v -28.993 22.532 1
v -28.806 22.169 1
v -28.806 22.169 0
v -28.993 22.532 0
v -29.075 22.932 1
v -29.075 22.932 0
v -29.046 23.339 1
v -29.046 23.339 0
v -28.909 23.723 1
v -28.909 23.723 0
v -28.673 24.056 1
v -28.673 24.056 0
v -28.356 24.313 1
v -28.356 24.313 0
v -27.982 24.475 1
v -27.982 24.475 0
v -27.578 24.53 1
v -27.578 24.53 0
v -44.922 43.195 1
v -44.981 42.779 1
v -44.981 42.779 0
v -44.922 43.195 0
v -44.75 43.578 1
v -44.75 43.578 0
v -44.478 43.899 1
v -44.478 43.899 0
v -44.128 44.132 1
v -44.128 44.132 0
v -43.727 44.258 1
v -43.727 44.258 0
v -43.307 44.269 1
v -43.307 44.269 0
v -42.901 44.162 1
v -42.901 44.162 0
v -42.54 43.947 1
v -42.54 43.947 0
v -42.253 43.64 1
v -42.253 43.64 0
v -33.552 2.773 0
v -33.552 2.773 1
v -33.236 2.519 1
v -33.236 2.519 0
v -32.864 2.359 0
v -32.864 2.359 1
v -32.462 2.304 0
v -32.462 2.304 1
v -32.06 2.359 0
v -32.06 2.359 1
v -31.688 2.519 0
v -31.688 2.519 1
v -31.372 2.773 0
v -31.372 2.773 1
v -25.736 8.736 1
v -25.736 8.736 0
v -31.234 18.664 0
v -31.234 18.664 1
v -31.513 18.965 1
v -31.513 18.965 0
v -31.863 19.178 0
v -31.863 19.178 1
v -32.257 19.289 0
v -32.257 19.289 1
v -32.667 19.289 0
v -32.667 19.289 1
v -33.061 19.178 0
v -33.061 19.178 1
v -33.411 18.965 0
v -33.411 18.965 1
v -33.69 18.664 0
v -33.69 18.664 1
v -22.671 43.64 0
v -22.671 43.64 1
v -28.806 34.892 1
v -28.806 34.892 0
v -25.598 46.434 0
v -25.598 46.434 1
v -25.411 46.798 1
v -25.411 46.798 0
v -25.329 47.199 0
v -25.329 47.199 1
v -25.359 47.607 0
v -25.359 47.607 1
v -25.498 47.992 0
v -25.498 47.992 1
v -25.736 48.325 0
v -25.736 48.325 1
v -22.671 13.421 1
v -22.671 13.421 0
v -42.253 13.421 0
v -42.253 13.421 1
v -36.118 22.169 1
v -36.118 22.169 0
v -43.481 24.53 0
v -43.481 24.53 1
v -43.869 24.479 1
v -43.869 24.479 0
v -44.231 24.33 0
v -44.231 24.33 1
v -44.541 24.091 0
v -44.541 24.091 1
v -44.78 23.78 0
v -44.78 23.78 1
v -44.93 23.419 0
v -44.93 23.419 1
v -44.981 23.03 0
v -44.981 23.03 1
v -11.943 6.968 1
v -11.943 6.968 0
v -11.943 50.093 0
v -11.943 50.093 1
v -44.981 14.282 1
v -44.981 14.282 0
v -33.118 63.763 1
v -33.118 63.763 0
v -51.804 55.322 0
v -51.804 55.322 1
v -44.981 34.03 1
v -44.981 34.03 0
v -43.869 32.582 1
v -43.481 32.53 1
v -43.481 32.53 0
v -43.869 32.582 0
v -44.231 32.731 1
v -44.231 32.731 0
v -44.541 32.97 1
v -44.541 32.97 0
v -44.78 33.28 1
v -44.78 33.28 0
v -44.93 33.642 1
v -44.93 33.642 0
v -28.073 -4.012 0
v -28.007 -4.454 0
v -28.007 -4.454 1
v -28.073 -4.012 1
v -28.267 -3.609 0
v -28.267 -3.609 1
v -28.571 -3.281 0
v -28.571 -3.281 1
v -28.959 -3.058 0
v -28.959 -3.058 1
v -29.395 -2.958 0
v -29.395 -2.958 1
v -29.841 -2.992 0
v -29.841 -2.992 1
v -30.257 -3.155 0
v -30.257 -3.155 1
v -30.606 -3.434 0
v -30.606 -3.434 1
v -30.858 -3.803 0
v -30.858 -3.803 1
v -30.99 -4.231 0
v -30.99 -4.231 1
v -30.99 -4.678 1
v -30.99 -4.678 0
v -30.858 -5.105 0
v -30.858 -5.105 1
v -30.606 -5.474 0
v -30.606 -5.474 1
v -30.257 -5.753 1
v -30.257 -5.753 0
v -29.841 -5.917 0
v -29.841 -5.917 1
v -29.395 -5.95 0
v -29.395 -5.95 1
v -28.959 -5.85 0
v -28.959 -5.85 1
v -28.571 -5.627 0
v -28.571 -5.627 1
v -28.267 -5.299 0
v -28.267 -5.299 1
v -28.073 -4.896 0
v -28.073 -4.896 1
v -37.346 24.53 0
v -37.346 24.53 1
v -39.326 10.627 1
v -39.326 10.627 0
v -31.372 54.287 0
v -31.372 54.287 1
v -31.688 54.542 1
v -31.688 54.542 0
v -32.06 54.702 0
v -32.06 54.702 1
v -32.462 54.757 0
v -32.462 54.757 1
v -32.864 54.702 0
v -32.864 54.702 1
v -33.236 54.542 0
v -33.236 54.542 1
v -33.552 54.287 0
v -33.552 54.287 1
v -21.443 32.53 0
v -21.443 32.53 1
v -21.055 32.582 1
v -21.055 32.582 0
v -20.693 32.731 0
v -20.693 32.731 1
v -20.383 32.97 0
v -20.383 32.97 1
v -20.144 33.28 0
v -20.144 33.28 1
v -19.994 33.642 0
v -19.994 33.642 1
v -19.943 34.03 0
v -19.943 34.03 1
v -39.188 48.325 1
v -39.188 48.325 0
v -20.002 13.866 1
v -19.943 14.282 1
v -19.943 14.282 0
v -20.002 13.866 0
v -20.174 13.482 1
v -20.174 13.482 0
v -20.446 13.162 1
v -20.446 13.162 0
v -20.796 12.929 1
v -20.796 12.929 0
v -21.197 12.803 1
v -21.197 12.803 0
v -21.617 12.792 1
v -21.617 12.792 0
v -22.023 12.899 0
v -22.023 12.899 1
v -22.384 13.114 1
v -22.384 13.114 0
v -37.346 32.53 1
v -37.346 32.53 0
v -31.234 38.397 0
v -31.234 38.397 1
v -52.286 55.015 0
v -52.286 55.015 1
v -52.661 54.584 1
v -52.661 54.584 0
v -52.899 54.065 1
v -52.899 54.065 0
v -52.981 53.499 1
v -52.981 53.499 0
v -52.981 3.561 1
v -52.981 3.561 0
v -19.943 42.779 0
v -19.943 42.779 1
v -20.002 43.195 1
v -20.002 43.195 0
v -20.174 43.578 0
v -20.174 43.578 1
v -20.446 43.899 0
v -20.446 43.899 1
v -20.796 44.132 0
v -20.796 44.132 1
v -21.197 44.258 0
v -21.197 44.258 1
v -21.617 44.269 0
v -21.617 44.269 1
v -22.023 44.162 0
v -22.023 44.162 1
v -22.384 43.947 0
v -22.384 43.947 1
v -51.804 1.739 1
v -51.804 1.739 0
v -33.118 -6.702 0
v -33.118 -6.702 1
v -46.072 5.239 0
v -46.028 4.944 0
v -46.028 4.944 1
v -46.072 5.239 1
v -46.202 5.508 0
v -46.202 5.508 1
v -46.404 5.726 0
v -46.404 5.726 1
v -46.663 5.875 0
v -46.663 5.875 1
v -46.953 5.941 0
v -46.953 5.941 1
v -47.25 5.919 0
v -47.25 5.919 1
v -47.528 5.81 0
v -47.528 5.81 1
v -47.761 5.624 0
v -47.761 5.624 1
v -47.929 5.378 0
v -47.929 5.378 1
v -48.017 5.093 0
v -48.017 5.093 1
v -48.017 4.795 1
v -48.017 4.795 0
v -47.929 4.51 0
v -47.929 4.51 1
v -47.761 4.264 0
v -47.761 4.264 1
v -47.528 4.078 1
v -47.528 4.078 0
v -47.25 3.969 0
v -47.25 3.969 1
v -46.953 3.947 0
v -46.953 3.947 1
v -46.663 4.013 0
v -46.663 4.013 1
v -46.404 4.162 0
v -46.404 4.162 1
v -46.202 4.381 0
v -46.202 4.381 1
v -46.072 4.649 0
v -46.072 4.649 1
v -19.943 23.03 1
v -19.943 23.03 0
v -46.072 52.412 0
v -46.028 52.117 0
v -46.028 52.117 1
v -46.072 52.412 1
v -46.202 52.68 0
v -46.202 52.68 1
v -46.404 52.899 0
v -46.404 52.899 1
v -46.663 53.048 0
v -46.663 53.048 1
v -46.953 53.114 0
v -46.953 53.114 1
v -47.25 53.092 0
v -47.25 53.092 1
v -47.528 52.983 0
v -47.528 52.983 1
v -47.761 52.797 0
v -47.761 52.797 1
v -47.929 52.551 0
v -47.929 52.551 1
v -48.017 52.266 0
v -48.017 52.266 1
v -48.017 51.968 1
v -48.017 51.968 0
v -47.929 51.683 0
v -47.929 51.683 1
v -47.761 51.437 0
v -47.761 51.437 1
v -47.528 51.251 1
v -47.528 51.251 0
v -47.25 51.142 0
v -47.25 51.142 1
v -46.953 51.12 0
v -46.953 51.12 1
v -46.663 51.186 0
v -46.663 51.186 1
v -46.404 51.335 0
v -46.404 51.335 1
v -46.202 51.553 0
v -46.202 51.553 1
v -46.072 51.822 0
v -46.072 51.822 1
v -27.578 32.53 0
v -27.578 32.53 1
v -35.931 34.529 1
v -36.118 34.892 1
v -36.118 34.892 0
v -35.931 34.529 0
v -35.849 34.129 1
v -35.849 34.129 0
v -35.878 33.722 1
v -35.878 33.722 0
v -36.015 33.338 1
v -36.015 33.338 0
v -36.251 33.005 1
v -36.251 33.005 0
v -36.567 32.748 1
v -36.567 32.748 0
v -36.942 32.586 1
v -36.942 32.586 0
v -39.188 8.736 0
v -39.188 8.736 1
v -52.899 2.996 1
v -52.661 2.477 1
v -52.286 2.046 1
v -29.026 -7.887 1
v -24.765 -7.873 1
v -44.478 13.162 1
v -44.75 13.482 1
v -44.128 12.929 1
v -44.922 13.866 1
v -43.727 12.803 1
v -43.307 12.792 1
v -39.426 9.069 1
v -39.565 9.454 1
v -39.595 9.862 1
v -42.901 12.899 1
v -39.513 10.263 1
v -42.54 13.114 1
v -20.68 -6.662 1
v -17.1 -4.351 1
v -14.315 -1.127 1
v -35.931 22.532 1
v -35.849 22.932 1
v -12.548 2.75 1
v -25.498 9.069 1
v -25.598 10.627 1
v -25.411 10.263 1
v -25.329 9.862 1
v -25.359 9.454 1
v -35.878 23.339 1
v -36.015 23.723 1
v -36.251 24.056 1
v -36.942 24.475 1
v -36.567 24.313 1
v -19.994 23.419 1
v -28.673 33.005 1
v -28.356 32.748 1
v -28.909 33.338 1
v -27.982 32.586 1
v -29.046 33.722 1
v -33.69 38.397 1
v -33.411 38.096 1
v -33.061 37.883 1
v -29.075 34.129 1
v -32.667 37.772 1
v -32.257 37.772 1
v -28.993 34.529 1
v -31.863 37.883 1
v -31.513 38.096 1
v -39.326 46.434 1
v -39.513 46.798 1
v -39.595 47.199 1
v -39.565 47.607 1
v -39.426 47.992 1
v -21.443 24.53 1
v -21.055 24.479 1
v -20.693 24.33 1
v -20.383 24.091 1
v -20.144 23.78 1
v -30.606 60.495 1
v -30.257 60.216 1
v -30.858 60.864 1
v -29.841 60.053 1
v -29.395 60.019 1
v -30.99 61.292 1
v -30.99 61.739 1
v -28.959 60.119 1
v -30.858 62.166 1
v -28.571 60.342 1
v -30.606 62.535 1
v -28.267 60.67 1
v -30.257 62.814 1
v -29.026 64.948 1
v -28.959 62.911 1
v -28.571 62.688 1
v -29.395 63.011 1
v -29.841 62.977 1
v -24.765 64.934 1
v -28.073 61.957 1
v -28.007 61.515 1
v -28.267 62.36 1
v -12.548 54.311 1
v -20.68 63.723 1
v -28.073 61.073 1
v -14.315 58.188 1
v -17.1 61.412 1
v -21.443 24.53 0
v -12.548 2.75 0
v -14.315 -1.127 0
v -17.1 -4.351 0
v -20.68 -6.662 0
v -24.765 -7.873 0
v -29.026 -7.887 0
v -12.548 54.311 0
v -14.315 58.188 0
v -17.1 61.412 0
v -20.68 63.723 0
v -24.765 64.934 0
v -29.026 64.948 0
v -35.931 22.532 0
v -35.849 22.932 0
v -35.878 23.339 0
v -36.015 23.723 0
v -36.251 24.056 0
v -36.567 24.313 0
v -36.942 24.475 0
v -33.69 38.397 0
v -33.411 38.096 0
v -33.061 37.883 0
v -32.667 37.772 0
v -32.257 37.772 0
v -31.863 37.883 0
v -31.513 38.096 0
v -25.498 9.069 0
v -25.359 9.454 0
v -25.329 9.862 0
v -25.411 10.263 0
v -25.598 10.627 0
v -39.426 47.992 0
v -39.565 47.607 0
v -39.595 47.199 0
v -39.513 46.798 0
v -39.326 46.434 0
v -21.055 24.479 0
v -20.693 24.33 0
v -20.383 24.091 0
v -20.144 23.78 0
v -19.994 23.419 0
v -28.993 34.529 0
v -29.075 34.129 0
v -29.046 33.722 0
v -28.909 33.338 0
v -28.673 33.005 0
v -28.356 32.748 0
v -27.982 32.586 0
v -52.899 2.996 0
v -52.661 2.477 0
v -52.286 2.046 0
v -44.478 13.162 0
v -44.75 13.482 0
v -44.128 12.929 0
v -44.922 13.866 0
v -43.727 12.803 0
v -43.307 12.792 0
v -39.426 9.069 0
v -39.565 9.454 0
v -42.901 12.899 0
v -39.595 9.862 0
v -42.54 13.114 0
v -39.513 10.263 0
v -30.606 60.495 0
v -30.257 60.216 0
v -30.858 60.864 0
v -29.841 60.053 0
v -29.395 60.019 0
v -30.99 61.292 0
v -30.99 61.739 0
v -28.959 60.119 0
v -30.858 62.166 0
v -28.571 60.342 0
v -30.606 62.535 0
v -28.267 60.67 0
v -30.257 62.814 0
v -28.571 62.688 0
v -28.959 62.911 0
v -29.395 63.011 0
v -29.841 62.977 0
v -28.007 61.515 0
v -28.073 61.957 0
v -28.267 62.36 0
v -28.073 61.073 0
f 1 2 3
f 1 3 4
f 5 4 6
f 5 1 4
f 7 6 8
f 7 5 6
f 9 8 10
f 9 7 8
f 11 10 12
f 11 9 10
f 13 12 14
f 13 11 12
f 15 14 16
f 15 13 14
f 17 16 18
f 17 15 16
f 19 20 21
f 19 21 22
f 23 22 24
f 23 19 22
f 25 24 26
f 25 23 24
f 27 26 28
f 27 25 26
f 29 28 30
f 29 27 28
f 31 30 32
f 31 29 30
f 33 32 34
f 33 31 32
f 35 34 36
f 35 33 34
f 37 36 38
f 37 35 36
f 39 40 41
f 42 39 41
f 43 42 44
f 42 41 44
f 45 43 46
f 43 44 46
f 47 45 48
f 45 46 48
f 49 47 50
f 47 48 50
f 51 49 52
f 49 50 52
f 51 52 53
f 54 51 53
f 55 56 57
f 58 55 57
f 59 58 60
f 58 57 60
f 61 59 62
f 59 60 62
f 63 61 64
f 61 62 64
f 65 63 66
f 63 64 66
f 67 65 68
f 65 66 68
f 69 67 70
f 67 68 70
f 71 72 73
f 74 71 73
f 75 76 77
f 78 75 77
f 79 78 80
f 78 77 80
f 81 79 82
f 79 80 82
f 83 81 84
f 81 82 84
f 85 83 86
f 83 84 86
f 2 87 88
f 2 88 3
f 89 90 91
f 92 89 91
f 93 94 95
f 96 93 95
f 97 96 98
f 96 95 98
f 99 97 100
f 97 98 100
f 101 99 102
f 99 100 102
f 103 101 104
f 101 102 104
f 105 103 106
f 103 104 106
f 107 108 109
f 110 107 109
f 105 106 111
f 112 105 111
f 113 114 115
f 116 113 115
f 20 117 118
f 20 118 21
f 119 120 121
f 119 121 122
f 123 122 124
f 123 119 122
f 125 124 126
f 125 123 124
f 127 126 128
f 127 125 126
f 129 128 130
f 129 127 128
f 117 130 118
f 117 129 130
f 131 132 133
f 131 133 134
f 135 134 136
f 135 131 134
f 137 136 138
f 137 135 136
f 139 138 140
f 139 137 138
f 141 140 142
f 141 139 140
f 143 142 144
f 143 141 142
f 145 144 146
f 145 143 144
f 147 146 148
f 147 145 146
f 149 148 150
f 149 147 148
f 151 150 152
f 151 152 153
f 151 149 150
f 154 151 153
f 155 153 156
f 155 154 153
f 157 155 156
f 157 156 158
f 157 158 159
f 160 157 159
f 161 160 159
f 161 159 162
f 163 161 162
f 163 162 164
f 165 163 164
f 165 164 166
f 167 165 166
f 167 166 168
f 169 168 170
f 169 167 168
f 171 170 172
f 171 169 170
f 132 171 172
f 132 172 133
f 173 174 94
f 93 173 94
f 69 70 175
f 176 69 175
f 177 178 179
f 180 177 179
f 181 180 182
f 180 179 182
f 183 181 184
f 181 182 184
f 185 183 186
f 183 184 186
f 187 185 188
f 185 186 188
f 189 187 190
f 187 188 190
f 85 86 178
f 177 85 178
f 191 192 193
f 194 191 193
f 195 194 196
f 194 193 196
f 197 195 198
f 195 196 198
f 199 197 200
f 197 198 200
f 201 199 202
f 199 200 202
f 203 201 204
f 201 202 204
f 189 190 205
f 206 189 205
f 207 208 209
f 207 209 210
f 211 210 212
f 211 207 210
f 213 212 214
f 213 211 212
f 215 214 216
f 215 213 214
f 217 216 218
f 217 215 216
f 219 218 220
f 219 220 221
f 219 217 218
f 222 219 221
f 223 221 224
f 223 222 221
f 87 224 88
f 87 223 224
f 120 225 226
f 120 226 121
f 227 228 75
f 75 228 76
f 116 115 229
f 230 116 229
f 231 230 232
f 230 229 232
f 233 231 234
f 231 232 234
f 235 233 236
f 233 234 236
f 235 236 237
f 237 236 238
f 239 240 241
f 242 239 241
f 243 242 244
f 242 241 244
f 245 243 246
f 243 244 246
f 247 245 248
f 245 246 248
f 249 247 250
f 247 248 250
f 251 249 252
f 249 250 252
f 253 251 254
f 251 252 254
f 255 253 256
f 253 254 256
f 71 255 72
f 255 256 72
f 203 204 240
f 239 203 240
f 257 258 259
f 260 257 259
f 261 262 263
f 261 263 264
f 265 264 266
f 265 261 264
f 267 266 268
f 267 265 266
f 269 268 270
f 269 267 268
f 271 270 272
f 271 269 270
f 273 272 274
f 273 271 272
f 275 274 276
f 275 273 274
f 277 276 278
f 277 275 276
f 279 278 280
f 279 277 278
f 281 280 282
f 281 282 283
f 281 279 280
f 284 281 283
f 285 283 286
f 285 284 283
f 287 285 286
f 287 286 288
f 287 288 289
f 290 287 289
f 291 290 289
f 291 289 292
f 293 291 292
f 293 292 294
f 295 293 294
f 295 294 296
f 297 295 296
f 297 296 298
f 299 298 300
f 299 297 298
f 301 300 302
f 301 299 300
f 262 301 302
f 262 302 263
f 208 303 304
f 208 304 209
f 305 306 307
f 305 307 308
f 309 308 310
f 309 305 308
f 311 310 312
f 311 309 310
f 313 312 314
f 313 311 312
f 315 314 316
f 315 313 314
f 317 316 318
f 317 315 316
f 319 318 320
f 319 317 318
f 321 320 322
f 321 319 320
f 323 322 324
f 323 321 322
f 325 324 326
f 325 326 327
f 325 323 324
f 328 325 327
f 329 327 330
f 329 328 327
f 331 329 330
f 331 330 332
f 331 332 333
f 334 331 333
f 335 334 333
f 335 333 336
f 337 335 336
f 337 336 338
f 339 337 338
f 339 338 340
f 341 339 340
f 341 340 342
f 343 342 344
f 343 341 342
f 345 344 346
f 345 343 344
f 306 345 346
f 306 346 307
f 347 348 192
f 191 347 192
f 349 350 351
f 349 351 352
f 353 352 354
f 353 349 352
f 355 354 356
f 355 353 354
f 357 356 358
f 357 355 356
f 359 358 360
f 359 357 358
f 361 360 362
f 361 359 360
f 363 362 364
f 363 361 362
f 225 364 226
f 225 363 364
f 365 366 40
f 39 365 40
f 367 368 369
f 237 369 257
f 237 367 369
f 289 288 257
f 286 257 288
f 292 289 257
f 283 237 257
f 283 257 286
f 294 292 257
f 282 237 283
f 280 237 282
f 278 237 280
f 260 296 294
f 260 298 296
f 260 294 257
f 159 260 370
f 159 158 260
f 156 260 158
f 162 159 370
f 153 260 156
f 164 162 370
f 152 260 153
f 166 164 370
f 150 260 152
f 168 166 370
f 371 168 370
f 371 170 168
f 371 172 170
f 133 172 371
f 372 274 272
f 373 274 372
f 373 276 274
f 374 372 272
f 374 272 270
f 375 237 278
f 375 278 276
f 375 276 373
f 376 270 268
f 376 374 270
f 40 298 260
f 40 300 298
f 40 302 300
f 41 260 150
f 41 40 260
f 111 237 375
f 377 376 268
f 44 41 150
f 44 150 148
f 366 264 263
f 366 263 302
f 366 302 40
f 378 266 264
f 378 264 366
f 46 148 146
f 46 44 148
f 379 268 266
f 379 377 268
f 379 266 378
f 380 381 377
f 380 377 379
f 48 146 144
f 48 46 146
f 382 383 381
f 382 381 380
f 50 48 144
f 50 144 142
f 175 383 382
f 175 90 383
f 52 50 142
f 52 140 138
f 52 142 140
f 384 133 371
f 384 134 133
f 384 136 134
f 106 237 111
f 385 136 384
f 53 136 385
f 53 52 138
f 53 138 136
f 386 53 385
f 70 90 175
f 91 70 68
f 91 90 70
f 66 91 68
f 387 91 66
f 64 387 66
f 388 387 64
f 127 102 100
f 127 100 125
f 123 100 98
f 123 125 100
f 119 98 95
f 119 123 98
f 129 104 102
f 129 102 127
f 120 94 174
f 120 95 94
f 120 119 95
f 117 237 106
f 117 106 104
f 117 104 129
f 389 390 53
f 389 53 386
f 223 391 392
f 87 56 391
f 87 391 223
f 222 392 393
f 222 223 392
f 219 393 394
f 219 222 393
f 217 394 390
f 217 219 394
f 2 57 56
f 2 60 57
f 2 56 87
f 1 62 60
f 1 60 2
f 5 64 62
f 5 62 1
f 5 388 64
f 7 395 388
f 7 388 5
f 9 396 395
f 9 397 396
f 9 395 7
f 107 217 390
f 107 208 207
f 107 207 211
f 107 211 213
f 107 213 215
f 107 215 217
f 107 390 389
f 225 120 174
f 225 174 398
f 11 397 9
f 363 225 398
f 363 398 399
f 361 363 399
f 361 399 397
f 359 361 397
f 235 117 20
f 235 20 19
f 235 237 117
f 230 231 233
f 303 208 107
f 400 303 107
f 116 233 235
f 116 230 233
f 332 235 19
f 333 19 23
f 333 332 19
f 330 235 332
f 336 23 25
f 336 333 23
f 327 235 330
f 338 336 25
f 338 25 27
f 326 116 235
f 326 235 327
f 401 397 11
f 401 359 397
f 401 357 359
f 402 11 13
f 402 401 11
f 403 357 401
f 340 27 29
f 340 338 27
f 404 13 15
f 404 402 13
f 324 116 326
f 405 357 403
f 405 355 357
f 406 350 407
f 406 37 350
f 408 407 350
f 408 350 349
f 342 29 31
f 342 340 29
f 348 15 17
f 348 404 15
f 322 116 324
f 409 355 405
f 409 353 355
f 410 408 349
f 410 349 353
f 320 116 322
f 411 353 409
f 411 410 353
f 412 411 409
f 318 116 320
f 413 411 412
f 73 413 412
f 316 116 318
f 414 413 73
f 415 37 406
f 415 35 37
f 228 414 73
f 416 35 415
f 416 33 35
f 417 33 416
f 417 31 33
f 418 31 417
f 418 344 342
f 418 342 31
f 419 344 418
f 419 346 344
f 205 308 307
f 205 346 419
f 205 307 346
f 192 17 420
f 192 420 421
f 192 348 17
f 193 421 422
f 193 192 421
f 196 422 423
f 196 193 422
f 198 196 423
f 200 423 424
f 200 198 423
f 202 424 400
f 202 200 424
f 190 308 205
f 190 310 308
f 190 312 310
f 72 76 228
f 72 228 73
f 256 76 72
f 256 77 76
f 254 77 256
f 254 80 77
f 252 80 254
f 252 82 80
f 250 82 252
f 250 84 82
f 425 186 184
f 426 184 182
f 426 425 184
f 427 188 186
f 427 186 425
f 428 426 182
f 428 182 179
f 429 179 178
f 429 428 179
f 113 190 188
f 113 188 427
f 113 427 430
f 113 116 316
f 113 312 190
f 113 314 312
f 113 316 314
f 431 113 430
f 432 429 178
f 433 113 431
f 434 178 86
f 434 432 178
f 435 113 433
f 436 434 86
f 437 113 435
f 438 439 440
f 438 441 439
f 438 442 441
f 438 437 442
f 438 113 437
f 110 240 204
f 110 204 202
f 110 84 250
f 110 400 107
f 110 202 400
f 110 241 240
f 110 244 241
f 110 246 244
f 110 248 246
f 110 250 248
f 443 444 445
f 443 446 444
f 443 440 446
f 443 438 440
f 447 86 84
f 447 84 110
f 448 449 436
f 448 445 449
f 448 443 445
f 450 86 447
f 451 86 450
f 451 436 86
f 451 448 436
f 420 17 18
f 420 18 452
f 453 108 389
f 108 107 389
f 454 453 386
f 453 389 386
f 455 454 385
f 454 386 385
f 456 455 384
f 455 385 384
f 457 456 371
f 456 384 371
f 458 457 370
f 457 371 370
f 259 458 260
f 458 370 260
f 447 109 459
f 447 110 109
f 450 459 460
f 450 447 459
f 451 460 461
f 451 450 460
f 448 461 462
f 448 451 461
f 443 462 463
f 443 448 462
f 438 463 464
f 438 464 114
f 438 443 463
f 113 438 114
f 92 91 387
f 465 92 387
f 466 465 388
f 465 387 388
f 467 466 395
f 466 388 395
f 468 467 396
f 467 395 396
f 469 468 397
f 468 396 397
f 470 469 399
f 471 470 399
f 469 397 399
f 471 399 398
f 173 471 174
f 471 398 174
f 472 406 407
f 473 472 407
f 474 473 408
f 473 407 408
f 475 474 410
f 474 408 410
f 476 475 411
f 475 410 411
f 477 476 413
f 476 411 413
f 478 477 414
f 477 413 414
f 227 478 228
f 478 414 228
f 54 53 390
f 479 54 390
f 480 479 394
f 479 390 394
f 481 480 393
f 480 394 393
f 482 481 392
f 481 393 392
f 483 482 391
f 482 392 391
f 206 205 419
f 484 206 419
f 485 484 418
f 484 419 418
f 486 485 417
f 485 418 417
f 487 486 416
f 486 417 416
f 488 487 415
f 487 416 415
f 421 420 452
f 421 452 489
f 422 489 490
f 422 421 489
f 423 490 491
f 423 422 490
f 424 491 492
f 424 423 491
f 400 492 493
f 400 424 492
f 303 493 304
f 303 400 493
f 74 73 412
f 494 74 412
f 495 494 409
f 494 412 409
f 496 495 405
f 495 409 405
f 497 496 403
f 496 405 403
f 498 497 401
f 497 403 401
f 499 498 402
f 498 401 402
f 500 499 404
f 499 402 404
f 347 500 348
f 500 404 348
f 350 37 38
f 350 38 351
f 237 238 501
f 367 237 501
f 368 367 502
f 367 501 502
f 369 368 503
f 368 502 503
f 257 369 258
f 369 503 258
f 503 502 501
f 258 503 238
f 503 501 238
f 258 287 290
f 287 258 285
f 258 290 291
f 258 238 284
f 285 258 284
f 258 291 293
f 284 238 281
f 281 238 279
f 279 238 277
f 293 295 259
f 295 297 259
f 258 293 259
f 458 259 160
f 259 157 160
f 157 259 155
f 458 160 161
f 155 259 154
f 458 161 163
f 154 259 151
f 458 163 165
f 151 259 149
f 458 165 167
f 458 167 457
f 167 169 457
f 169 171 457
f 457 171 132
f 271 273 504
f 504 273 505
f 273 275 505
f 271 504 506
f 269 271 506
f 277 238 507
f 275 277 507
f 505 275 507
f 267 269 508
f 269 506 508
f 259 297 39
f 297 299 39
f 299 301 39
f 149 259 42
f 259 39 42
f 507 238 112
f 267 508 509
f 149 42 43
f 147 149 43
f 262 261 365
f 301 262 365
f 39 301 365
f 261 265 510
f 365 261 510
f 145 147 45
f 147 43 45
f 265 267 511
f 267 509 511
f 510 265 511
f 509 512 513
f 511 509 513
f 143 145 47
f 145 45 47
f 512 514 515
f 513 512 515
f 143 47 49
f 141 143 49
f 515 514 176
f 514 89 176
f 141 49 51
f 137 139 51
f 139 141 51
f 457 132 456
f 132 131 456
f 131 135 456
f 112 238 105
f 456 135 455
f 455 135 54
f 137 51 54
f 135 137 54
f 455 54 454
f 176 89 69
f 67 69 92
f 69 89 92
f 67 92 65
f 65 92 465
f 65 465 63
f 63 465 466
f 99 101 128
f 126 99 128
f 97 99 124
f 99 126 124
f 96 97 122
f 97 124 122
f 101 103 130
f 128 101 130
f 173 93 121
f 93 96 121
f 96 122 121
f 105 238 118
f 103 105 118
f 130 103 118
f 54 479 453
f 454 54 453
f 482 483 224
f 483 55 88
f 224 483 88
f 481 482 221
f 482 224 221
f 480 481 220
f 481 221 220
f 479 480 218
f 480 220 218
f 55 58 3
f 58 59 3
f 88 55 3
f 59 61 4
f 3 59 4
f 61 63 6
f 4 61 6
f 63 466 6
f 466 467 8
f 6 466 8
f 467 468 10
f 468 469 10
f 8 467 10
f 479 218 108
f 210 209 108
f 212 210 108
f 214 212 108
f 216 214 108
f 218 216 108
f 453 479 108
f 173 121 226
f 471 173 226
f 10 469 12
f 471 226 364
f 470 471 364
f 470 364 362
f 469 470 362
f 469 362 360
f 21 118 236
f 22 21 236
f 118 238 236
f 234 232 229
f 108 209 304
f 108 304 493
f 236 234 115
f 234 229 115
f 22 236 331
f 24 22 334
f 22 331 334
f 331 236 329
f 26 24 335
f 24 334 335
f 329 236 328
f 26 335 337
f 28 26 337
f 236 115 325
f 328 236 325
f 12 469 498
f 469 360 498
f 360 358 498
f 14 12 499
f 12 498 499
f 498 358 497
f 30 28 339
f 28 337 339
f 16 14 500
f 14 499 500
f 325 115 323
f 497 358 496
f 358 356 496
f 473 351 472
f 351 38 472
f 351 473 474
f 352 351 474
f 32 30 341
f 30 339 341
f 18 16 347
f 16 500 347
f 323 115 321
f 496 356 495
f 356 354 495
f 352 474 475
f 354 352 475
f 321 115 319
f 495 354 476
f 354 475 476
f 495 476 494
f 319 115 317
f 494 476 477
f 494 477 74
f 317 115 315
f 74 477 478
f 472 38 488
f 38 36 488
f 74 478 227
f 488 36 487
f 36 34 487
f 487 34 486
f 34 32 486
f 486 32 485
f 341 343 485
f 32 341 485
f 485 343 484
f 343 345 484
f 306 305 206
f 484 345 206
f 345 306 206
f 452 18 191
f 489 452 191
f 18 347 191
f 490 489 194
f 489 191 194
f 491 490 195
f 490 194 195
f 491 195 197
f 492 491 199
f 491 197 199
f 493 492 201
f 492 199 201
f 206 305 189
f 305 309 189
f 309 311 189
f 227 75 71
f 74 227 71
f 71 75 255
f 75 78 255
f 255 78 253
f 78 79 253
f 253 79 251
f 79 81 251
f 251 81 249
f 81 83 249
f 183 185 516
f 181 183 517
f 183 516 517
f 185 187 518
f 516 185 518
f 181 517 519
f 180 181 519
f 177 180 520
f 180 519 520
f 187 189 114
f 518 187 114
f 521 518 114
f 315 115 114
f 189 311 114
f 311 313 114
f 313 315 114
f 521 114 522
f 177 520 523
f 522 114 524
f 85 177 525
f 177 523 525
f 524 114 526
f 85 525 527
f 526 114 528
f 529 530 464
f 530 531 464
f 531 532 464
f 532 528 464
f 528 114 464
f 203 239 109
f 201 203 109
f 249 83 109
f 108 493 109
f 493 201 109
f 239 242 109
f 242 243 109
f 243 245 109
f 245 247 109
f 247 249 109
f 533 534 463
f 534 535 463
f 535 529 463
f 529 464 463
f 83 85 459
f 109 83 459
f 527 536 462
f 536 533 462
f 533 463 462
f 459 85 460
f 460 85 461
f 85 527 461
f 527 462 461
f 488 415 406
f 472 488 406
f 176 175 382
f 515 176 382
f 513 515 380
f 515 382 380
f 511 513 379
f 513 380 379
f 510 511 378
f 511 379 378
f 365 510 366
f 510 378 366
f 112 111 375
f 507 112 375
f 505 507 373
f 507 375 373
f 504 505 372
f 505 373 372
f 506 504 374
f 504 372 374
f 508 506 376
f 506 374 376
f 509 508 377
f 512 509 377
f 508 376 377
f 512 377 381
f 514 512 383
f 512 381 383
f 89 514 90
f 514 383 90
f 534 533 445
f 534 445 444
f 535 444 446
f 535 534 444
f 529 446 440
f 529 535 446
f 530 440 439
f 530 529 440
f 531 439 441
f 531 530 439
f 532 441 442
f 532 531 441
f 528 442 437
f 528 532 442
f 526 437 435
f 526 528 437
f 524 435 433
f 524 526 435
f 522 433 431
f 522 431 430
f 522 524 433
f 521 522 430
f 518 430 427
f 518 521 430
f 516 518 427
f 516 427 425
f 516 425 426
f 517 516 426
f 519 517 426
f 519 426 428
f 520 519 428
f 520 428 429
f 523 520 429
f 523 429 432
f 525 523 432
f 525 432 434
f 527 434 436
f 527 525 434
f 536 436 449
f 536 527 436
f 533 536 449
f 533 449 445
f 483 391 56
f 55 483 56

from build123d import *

# Parameters (mm, degrees)
CROQUIS3_R              = 1
CROQUIS3_R_2            = 1.500000006
CROQUIS3_R_3            = 1.000000012
CROQUIS3_R_4            = 1.5
SALIENTE_EXTRUIR1_DEPTH = 1
REDONDEO1_R             = 15
CORTAR_EXTRUIR1_DEPTH   = 1


with BuildPart() as part:
    # Croquis3 → Saliente-Extruir1 (new body)
    # profile 1 of 2: a face of its own
    with BuildSketch(Plane.XY):
        with BuildLine():
            Line((-11.943236247, 28.530474649), (-52.980665481, 28.530474649))
            Line((-52.980665481, 28.530474649), (-52.980665481, 3.561485174))
            ThreePointArc((-52.980665481, 3.561485174), (-52.660950937, 2.476754431), (-51.804024696, 1.738827882))
            Line((-51.804024696, 1.738827882), (-11.943236247, -16.267709961))
            Line((-11.943236247, -16.267709961), (-11.943236247, 28.530474649))
        make_face()
        with Locations((-47.027941845, 4.944189889)):
            Circle(CROQUIS3_R, mode=Mode.SUBTRACT)
        with Locations((-29.506723336, -4.454119513)):
            Circle(CROQUIS3_R_2, mode=Mode.SUBTRACT)
    # profile 2 of 2: a face of its own
    with BuildSketch(Plane.XY):
        with BuildLine():
            ThreePointArc((-51.804024696, 55.322121417), (-52.660950937, 54.584194868), (-52.980665481, 53.499464125))
            Line((-52.980665481, 53.499464125), (-52.980665481, 28.530474649))
            Line((-52.980665481, 28.530474649), (-11.943236247, 28.530474649))
            Line((-11.943236247, 28.530474649), (-11.943236247, 73.32865926))
            Line((-11.943236247, 73.32865926), (-51.804024696, 55.322121417))
        make_face()
        with Locations((-47.027941845, 52.116759452)):
            Circle(CROQUIS3_R_3, mode=Mode.SUBTRACT)
        with Locations((-29.506723336, 61.515068812)):
            Circle(CROQUIS3_R_4, mode=Mode.SUBTRACT)
    extrude(amount=SALIENTE_EXTRUIR1_DEPTH)

    # Redondeo1
    redondeo1_edges = [part.edges().sort_by_distance(p)[0] for p in [
        (-11.943236247, -16.267709961, 0.5),
        (-11.943236247, 73.32865926, 0.5),
    ]]
    fillet(redondeo1_edges, radius=REDONDEO1_R)

    # Croquis4 → Cortar-Extruir1 (cut)
    with BuildSketch(Plane.XY.offset(1)):
        with BuildLine():
            Line((-44.980665481, 34.030474649), (-44.980665481, 42.77886195))
            ThreePointArc((-44.980665481, 42.77886195), (-43.932223122, 44.209279965), (-42.252537885, 43.64008353))
            Line((-42.252537885, 43.64008353), (-36.117751927, 34.891696229))
            ThreePointArc((-36.117751927, 34.891696229), (-36.015121774, 33.338315841), (-37.345879522, 32.530474649))
            Line((-37.345879522, 32.530474649), (-43.480665481, 32.530474649))
            ThreePointArc((-43.480665481, 32.530474649), (-44.541325653, 32.969814478), (-44.980665481, 34.030474649))
        make_face()
        with BuildLine():
            Line((-22.671363843, 43.64008353), (-28.806149801, 34.891696229))
            ThreePointArc((-28.806149801, 34.891696229), (-28.908779954, 33.338315841), (-27.578022206, 32.530474649))
            Line((-27.578022206, 32.530474649), (-21.443236247, 32.530474649))
            ThreePointArc((-21.443236247, 32.530474649), (-20.382576076, 32.969814478), (-19.943236247, 34.030474649))
            Line((-19.943236247, 34.030474649), (-19.943236247, 42.77886195))
            ThreePointArc((-19.943236247, 42.77886195), (-20.991678606, 44.209279965), (-22.671363843, 43.64008353))
        make_face()
        with BuildLine():
            Line((-33.552014817, 54.287454199), (-39.187957869, 48.325271549))
            ThreePointArc((-39.187957869, 48.325271549), (-39.593914564, 47.404042805), (-39.326021512, 46.433632298))
            Line((-39.326021512, 46.433632298), (-33.69007846, 38.396609824))
            ThreePointArc((-33.69007846, 38.396609824), (-32.461950864, 37.757831403), (-31.233823268, 38.396609824))
            Line((-31.233823268, 38.396609824), (-25.597880217, 46.433632298))
            ThreePointArc((-25.597880217, 46.433632298), (-25.329987165, 47.404042805), (-25.735943859, 48.325271549))
            Line((-25.735943859, 48.325271549), (-31.371886911, 54.287454199))
            ThreePointArc((-31.371886911, 54.287454199), (-32.461950864, 54.757036527), (-33.552014817, 54.287454199))
        make_face()
        with BuildLine():
            Line((-31.371886911, 2.7734951), (-25.735943859, 8.73567775))
            ThreePointArc((-25.735943859, 8.73567775), (-25.329987165, 9.656906494), (-25.597880217, 10.627317001))
            Line((-25.597880217, 10.627317001), (-31.233823268, 18.664339475))
            ThreePointArc((-31.233823268, 18.664339475), (-32.461950864, 19.303117896), (-33.69007846, 18.664339475))
            Line((-33.69007846, 18.664339475), (-39.326021512, 10.627317001))
            ThreePointArc((-39.326021512, 10.627317001), (-39.593914564, 9.656906494), (-39.187957869, 8.73567775))
            Line((-39.187957869, 8.73567775), (-33.552014817, 2.7734951))
            ThreePointArc((-33.552014817, 2.7734951), (-32.461950864, 2.303912771), (-31.371886911, 2.7734951))
        make_face()
        with BuildLine():
            Line((-27.578022206, 24.530474649), (-21.443236247, 24.530474649))
            ThreePointArc((-21.443236247, 24.530474649), (-20.382576076, 24.091134821), (-19.943236247, 23.030474649))
            Line((-19.943236247, 23.030474649), (-19.943236247, 14.282087348))
            ThreePointArc((-19.943236247, 14.282087348), (-20.991678606, 12.851669334), (-22.671363843, 13.420865769))
            Line((-22.671363843, 13.420865769), (-28.806149801, 22.16925307))
            ThreePointArc((-28.806149801, 22.16925307), (-28.908779954, 23.722633457), (-27.578022206, 24.530474649))
        make_face()
        with BuildLine():
            Line((-37.345879522, 24.530474649), (-43.480665481, 24.530474649))
            ThreePointArc((-43.480665481, 24.530474649), (-44.541325653, 24.091134821), (-44.980665481, 23.030474649))
            Line((-44.980665481, 23.030474649), (-44.980665481, 14.282087348))
            ThreePointArc((-44.980665481, 14.282087348), (-43.932223122, 12.851669334), (-42.252537885, 13.420865769))
            Line((-42.252537885, 13.420865769), (-36.117751927, 22.16925307))
            ThreePointArc((-36.117751927, 22.16925307), (-36.015121774, 23.722633457), (-37.345879522, 24.530474649))
        make_face()
    extrude(amount=-CORTAR_EXTRUIR1_DEPTH, mode=Mode.SUBTRACT)


solid = part.part
